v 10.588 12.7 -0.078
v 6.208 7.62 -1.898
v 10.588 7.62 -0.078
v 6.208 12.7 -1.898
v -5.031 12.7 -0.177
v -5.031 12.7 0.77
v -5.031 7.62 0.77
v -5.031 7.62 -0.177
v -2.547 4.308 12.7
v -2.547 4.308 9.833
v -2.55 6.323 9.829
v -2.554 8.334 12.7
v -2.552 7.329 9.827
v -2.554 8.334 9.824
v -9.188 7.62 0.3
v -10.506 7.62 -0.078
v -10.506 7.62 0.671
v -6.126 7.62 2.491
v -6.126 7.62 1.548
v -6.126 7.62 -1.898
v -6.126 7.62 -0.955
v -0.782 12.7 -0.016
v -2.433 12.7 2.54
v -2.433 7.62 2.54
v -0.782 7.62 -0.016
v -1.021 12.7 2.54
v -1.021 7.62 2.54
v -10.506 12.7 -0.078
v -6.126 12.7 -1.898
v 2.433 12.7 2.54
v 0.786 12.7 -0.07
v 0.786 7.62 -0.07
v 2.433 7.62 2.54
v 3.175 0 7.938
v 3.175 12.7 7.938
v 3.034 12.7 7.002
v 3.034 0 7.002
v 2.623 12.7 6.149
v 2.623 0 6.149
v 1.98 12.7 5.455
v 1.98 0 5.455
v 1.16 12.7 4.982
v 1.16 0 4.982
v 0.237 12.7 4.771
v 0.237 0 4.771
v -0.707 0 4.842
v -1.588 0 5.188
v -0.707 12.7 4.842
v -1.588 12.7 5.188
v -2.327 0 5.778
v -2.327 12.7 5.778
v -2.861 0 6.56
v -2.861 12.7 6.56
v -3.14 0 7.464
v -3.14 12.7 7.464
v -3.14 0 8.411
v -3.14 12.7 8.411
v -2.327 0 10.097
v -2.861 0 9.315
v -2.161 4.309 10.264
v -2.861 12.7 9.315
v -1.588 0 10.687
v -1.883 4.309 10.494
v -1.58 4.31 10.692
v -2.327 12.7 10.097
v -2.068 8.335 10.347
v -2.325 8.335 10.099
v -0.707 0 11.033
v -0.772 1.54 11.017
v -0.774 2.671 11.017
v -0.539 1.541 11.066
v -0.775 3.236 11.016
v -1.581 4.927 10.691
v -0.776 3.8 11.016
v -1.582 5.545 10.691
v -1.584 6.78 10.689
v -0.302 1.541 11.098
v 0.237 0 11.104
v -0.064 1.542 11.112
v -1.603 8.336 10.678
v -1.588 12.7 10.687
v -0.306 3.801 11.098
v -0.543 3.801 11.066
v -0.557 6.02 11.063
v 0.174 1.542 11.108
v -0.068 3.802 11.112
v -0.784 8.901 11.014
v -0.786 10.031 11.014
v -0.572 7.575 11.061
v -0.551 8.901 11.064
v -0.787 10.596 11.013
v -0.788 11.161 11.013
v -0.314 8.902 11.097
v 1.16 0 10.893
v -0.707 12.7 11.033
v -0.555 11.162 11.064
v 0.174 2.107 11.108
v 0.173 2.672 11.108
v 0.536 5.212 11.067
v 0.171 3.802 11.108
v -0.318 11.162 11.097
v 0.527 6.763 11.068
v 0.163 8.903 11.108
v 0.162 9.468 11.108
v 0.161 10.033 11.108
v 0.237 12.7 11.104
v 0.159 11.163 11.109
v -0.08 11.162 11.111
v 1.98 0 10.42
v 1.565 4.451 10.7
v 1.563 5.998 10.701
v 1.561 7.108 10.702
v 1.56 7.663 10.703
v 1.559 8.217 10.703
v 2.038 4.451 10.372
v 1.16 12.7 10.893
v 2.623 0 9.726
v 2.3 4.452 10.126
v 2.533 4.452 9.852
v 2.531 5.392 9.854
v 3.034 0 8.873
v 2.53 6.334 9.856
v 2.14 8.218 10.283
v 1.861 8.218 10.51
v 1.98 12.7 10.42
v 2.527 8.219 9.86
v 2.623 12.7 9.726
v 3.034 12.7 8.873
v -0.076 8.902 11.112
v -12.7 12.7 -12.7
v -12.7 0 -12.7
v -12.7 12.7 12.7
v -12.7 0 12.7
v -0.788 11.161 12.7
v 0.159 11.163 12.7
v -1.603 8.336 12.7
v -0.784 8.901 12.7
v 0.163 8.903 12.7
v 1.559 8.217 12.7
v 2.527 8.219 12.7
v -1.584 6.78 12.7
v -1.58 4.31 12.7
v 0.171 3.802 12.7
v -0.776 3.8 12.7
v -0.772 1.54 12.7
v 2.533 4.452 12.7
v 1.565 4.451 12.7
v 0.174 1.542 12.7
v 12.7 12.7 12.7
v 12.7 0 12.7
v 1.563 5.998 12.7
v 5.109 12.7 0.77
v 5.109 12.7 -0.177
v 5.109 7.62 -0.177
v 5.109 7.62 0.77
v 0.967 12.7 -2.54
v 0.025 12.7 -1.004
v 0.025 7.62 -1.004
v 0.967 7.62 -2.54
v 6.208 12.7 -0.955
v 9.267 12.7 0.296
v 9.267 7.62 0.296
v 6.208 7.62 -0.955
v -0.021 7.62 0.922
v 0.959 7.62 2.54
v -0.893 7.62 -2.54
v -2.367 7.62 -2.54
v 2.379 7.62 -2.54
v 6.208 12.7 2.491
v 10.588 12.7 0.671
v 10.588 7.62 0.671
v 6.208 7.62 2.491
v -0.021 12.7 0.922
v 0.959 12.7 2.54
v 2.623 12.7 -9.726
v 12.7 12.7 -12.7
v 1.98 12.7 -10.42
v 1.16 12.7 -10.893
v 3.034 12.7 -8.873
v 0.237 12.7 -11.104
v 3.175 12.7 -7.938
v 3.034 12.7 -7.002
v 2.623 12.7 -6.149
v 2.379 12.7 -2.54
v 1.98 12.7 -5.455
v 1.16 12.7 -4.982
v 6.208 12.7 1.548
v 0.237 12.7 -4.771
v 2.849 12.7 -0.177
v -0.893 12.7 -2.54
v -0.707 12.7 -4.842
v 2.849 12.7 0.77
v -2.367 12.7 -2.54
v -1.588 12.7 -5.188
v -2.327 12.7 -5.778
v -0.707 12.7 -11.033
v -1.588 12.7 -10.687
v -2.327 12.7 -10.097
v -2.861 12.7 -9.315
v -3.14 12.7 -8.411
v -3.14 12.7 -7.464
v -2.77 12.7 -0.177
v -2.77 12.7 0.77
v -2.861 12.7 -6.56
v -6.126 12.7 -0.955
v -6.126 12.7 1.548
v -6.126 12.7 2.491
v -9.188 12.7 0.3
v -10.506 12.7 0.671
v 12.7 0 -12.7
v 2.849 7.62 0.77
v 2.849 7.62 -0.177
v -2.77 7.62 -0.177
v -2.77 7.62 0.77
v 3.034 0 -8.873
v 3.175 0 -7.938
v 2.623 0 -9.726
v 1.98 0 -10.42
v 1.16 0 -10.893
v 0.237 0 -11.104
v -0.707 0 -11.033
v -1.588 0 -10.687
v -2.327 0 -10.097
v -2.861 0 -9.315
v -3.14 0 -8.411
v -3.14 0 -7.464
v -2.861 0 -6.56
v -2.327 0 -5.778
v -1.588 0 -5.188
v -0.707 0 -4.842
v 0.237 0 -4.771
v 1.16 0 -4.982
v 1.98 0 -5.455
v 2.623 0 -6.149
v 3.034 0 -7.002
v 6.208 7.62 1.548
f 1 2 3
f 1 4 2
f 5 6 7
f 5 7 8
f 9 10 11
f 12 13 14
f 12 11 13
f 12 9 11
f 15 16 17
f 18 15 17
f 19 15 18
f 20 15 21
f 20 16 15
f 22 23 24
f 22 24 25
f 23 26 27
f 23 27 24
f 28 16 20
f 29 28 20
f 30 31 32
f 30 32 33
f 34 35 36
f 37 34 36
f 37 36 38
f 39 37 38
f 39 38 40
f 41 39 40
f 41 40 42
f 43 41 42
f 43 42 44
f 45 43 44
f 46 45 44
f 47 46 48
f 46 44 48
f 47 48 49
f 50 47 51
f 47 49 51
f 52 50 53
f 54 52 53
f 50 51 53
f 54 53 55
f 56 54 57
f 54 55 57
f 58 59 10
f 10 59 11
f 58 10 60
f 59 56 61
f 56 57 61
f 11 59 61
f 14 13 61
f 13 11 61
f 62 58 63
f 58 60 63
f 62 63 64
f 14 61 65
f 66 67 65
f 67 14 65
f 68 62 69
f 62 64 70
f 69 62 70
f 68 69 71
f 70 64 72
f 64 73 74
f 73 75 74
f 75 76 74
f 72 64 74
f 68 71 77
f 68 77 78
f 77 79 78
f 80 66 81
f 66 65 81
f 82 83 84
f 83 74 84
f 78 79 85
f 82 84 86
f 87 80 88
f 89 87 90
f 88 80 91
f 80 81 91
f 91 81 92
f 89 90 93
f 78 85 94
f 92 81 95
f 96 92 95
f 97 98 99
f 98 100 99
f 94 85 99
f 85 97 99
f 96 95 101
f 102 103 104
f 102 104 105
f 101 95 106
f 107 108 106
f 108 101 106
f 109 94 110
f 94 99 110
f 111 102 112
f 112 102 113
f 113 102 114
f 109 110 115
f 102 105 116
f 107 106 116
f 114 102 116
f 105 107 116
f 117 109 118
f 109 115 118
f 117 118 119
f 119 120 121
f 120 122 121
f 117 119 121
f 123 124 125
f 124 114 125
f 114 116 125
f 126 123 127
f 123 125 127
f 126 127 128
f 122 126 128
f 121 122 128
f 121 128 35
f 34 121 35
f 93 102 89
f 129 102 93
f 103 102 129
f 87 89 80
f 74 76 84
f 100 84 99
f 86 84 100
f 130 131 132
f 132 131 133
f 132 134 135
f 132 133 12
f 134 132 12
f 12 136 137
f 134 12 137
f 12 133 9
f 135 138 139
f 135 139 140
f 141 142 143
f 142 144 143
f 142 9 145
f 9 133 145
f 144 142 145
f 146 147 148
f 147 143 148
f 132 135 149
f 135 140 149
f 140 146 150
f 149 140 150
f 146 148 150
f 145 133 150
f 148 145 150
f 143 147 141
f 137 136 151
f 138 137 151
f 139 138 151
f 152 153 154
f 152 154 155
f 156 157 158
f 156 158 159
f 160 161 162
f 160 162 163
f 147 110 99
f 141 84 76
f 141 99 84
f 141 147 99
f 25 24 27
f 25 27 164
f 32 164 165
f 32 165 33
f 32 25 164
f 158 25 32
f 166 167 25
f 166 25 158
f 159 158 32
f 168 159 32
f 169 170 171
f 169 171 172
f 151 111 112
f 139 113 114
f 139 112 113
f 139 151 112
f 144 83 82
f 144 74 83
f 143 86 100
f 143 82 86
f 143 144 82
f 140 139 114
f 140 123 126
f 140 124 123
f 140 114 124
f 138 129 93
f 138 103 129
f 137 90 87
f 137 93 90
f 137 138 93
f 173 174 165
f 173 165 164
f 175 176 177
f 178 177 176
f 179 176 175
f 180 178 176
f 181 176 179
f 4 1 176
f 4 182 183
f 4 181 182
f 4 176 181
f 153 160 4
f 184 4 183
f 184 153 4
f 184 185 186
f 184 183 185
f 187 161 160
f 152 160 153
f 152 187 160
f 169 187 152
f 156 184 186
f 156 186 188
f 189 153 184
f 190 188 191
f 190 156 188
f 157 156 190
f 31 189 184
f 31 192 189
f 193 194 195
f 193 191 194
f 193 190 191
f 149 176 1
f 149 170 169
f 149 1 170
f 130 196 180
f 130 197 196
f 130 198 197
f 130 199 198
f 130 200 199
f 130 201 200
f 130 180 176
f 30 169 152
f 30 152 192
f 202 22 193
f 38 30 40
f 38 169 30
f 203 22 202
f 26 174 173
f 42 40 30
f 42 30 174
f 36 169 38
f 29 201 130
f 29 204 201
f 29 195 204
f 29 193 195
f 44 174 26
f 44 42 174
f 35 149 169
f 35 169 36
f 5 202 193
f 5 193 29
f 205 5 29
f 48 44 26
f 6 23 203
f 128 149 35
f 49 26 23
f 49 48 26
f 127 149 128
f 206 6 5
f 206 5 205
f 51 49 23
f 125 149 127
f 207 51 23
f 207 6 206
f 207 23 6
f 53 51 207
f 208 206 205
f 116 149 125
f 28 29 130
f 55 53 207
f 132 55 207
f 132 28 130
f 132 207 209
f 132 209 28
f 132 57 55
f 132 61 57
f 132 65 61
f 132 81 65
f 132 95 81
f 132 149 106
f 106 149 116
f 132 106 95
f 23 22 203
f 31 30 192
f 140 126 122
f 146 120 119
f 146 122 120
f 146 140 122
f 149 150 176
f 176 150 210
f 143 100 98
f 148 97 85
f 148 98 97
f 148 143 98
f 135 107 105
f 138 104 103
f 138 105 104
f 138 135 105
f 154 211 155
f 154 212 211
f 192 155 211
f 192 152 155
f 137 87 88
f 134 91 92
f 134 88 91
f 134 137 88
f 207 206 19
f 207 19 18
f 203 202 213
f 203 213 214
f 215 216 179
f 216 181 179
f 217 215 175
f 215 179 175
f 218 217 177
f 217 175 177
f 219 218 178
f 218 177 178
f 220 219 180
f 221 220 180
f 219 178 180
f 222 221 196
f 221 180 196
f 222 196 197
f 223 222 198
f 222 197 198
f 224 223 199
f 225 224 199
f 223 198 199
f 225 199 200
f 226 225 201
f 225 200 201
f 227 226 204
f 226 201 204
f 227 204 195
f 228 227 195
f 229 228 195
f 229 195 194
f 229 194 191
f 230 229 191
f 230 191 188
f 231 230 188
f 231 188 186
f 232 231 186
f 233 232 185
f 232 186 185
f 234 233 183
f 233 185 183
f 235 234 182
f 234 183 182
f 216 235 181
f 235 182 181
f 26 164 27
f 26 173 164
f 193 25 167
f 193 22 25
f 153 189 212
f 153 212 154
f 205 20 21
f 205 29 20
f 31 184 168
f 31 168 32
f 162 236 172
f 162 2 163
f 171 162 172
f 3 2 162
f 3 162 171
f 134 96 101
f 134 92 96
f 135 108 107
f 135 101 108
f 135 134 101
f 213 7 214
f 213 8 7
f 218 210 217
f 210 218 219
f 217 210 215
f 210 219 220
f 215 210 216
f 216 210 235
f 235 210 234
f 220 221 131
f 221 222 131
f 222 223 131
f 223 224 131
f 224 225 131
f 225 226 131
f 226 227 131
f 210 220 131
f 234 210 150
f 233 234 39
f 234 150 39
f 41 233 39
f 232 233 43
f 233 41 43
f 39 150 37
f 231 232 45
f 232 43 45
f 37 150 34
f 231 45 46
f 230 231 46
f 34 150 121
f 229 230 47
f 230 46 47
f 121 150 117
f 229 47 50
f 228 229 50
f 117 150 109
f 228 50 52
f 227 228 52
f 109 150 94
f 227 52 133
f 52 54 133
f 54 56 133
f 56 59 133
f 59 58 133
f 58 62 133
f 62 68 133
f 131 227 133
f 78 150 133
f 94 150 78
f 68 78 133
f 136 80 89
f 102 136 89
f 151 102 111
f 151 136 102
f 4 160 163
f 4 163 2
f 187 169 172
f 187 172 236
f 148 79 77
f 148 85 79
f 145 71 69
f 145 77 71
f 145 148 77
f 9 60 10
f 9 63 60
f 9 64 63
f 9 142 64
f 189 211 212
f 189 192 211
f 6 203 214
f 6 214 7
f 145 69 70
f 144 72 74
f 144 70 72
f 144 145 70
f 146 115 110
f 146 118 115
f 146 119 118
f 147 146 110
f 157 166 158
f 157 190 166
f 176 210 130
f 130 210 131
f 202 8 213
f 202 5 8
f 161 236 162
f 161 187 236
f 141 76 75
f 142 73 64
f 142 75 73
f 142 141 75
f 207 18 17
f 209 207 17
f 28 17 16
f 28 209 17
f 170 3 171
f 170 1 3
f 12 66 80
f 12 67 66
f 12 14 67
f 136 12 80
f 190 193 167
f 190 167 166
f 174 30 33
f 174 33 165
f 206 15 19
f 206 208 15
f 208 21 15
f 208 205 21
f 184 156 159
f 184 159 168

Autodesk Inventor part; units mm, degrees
ref_plane "YZ Plane" through (0, 0, 0) normal (1, 0, 0) x (0, 1, 0)
ref_plane "XZ Plane" through (0, 0, 0) normal (0, 1, 0) x (-1, 0, 0)
ref_plane "XY Plane" through (0, 0, 0) normal (0, 0, 1) x (1, 0, 0)
sketch "Sketch1" plane through (0, 0, 0) normal (0, 1, 0) x (-1, 0, 0)
  line L0 (12.7, 12.7) -> (-12.7, 12.7)
  line L1 (-12.7, 12.7) -> (-12.7, -12.7)
  line L2 (-12.7, -12.7) -> (12.7, -12.7)
  line L3 (12.7, -12.7) -> (12.7, 12.7)
  line L4 (12.7, 12.7) -> (-12.7, -12.7) construction
  line L5 (-12.7, 12.7) -> (12.7, -12.7) construction
  point P0 (0, 0)
  dimension "d0" = 25.4
  dimension "d1" = 25.4
extrude "Extrusion1" add sketch "Sketch1" along normal blind 12.7
sketch "Sketch2" plane through (0, 12.7, 0) normal (0, 1, 0) x (1, 0, 0)
  line L0 (-12.7, 12.7) -> (-12.7, -12.7) construction
  line L1 (-12.7, 0) -> (12.7, 0) construction
  line L2 (12.7, -12.7) -> (12.7, 12.7) construction
  line L3 (-6.1256, -2.4906) -> (-10.5058, -0.671)
  line L4 (-10.5058, -0.671) -> (-10.5058, 0.0782)
  line L5 (-10.5058, 0.0782) -> (-6.1256, 1.8978)
  line L6 (-6.1256, 1.8978) -> (-6.1256, 0.9551)
  line L7 (-6.1256, 0.9551) -> (-9.1885, -0.3005)
  line L8 (-9.1885, -0.3005) -> (-6.1256, -1.5479)
  line L9 (-6.1256, -1.5479) -> (-6.1256, -2.4906)
  line L10 (-2.7705, -0.7698) -> (-5.0306, -0.7698)
  line L11 (-5.0306, -0.7698) -> (-5.0306, 0.177)
  line L12 (-5.0306, 0.177) -> (-2.7705, 0.177)
  line L13 (-2.7705, 0.177) -> (-2.7705, -0.7698)
  line L14 (2.433, -2.54) -> (0.9592, -2.54)
  line L15 (0.9592, -2.54) -> (-0.0206, -0.9221)
  line L16 (-0.0206, -0.9221) -> (-1.0209, -2.54)
  line L17 (-1.0209, -2.54) -> (-2.433, -2.54)
  line L18 (-2.433, -2.54) -> (-0.7822, 0.0165)
  line L19 (-0.7822, 0.0165) -> (-2.3671, 2.54)
  line L20 (-2.3671, 2.54) -> (-0.8933, 2.54)
  line L21 (-0.8933, 2.54) -> (0.0247, 1.0045)
  line L22 (0.0247, 1.0045) -> (0.9674, 2.54)
  line L23 (0.9674, 2.54) -> (2.3794, 2.54)
  line L24 (2.3794, 2.54) -> (0.7863, 0.07)
  line L25 (0.7863, 0.07) -> (2.433, -2.54)
  line L26 (5.1088, -0.7698) -> (2.8488, -0.7698)
  line L27 (2.8488, -0.7698) -> (2.8488, 0.177)
  line L28 (2.8488, 0.177) -> (5.1088, 0.177)
  line L29 (5.1088, 0.177) -> (5.1088, -0.7698)
  line L30 (10.5881, -0.671) -> (6.208, -2.4906)
  line L31 (6.208, -2.4906) -> (6.208, -1.5479)
  line L32 (6.208, -1.5479) -> (9.2667, -0.2964)
  line L33 (9.2667, -0.2964) -> (6.208, 0.9551)
  line L34 (6.208, 0.9551) -> (6.208, 1.8978)
  line L35 (6.208, 1.8978) -> (10.5881, 0.0782)
  line L36 (10.5881, 0.0782) -> (10.5881, -0.671)
  point P0 (0, 0)
extrude "Extrusion2" cut sketch "Sketch2" against normal blind 5.08
sketch "Sketch3" plane through (-12.7, 0, 12.7) normal (0, 0, 1) x (1, 0, 0)
  line L0 (12.6794, 12.7) -> (11.6791, 12.7) construction
  line L1 (12.7, 0) -> (12.6794, 12.7) construction
  line L2 (11.9158, 8.9011) -> (11.9121, 11.1612)
  line L3 (11.9121, 11.1612) -> (12.8589, 11.1627)
  line L4 (12.8589, 11.1627) -> (12.8626, 8.9026)
  line L5 (12.8626, 8.9026) -> (11.9158, 8.9011)
  line L6 (10.153, 4.3081) -> (10.1465, 8.3342)
  line L7 (10.1465, 8.3342) -> (11.0974, 8.3358)
  line L8 (11.0974, 8.3358) -> (14.2629, 5.9985)
  line L9 (14.2629, 5.9985) -> (14.2593, 8.2174)
  line L10 (14.2593, 8.2174) -> (15.2267, 8.219)
  line L11 (15.2267, 8.219) -> (15.2328, 4.4522)
  line L12 (15.2328, 4.4522) -> (14.2654, 4.4506)
  line L13 (14.2654, 4.4506) -> (11.1164, 6.7797)
  line L14 (11.1164, 6.7797) -> (11.1204, 4.3097)
  line L15 (11.1204, 4.3097) -> (10.153, 4.3081)
  line L16 (11.9277, 1.5405) -> (11.924, 3.8005)
  line L17 (11.924, 3.8005) -> (12.8709, 3.8021)
  line L18 (12.8709, 3.8021) -> (12.8745, 1.542)
  line L19 (12.8745, 1.542) -> (11.9277, 1.5405)
extrude "Extrusion3" cut sketch "Sketch3" against normal blind 5.08
sketch "Sketch11" plane through (0, 12.7, 0) normal (0, 1, 0) x (1, 0, 0)
  circle A0 centre (0, 7.9375) radius 3.175
  circle A1 centre (0, -7.9375) radius 3.175
  line L0 (12.7, 12.7) -> (-12.7, 12.7) projected
  line L1 (-12.7, -12.7) -> (12.7, -12.7) projected
  point P0 (0, 0)
  dimension "d81" = 6.35
  dimension "d82" = 4.7625
  dimension "d83" = 4.7625
extrude "Extrusion4" cut sketch "Sketch11" against normal blind 25.4
equation "\"d46\" = 0.125 * Sketch7_Pitch"
equation "\"Sketch7_Pitch\" = 1.27"
equation "\"d48\" = 60deg"
equation "\"d67\" = 0.125 * Sketch9_Pitch"
equation "\"Sketch9_Pitch\" = 1.27"
equation "\"d69\" = 60deg"
equation "\"d99\" = 0.125 * Sketch12_Pitch"
equation "\"Sketch12_Pitch\" = 1.27"
equation "\"d101\" = 60deg"
equation "\"d120\" = 0.125 * Sketch14_Pitch"
equation "\"Sketch14_Pitch\" = 1.27"
equation "\"d122\" = 60deg"
equation "\"d143\" = 55deg"
equation "\"Sketch16_Pitch\" = 1.27"
equation "\"d161\" = 55deg"
equation "\"Sketch18_Pitch\" = 1.27"
properties part number "squareCalibrationBlock-1in"
